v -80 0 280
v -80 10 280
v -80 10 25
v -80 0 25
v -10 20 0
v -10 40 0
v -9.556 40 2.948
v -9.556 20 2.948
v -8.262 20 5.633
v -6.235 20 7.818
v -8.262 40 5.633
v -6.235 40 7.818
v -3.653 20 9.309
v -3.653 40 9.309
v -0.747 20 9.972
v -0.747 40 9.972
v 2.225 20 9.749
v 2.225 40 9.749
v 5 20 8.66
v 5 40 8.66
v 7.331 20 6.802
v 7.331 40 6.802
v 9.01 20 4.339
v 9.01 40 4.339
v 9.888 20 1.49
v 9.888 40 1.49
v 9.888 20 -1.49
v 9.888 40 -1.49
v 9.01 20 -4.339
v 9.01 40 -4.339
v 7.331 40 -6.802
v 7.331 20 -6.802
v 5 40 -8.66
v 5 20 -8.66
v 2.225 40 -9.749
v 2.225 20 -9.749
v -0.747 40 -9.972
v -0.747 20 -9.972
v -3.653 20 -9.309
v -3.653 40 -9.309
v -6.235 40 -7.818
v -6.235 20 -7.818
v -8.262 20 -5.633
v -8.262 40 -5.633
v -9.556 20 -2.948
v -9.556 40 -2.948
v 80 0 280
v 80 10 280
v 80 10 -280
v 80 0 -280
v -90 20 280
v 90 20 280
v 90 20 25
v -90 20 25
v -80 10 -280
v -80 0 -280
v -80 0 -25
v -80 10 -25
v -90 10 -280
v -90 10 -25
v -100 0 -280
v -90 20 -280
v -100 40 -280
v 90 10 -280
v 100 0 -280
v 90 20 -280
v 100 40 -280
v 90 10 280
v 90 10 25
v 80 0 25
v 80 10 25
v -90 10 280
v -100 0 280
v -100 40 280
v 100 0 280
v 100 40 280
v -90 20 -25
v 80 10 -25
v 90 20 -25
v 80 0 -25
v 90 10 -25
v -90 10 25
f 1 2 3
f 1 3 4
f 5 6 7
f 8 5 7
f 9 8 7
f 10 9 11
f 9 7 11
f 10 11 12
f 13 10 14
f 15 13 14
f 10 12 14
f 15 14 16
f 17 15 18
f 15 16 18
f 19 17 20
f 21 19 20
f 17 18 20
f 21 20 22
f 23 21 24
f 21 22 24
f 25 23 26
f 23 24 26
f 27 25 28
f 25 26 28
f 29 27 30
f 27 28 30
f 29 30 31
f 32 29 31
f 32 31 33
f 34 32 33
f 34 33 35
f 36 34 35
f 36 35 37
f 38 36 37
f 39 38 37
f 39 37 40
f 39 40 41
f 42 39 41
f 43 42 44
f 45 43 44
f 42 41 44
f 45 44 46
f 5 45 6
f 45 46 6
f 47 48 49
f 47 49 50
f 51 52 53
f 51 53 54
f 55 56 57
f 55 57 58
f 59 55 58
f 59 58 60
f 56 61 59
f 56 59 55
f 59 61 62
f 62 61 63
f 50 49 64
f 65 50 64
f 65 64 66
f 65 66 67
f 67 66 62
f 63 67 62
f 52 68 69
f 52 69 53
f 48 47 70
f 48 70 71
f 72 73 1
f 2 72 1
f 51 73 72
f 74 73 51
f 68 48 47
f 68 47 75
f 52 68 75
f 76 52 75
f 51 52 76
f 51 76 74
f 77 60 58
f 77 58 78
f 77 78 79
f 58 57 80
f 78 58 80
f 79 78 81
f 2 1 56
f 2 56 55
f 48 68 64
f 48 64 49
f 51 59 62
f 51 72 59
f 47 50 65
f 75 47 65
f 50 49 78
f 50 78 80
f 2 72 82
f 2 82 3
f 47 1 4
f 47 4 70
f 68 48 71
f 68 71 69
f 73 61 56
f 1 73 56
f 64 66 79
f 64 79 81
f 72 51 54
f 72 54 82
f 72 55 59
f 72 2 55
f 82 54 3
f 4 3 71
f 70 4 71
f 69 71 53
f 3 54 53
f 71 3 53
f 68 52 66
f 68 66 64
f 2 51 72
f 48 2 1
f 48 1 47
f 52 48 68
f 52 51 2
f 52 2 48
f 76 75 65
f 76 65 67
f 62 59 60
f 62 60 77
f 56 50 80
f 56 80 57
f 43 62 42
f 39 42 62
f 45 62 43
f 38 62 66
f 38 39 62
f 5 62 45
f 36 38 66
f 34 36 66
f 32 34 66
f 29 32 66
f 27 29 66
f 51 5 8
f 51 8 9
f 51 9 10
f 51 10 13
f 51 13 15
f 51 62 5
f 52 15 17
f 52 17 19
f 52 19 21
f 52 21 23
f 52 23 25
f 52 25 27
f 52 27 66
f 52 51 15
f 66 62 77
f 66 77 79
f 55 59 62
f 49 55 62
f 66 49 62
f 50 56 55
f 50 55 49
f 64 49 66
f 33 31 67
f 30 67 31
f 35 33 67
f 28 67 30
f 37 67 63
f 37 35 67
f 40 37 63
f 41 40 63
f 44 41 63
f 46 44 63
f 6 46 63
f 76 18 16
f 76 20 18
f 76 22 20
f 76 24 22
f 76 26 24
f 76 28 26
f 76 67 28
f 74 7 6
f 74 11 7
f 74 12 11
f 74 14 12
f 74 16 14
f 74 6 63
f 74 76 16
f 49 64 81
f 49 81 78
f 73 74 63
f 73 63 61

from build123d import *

# Parameters (mm, degrees)
F1_DEPTH      = 280
F1_DEPTH_BACK = 280
F2_R          = 10
F3_DEPTH      = 20
F5_DEPTH      = 255
F7_DEPTH      = 255


with BuildPart() as f1:
    # F0 (on Top) → F1 (new body, two sides)
    with BuildSketch(Plane.XY) as f1_sk:
        Polygon((-90, 20), (0, 20), (90, 20), (90, 10), (80, 10), (80, 0), (100, 0), (100, 40), (0, 40), (-100, 40), (-100, 0), (-80, 0), (-80, 10), (-90, 10), align=None)
    extrude(amount=F1_DEPTH)
    extrude(f1_sk.sketch, amount=-F1_DEPTH_BACK)

    # F2 (on face) → F3 (cut)
    with BuildSketch(Plane(origin=(0, 40, 0), x_dir=(-1, 0, 0), z_dir=(0, 1, 0))):
        Circle(F2_R)
    extrude(amount=-F3_DEPTH, mode=Mode.SUBTRACT)


with BuildPart() as f5:
    # F4 (on face) → F5 (new body)
    with BuildSketch(Plane.XY.offset(280)):
        Polygon((90, 20), (-90, 20), (-90, 10), (-80, 10), (-80, 0), (80, 0), (80, 10), (90, 10), align=None)
    extrude(amount=-F5_DEPTH)


with BuildPart() as f7:
    # F6 (on face) → F7 (new body)
    with BuildSketch(Plane(origin=(0, 0, -280), x_dir=(1, 0, 0), z_dir=(0, 0, -1))):
        Polygon((80, 0), (-80, 0), (-80, -10), (-90, -10), (-90, -20), (90, -20), (90, -10), (80, -10), align=None)
    extrude(amount=-F7_DEPTH)


solid = Compound([f1.part, f5.part, f7.part])
